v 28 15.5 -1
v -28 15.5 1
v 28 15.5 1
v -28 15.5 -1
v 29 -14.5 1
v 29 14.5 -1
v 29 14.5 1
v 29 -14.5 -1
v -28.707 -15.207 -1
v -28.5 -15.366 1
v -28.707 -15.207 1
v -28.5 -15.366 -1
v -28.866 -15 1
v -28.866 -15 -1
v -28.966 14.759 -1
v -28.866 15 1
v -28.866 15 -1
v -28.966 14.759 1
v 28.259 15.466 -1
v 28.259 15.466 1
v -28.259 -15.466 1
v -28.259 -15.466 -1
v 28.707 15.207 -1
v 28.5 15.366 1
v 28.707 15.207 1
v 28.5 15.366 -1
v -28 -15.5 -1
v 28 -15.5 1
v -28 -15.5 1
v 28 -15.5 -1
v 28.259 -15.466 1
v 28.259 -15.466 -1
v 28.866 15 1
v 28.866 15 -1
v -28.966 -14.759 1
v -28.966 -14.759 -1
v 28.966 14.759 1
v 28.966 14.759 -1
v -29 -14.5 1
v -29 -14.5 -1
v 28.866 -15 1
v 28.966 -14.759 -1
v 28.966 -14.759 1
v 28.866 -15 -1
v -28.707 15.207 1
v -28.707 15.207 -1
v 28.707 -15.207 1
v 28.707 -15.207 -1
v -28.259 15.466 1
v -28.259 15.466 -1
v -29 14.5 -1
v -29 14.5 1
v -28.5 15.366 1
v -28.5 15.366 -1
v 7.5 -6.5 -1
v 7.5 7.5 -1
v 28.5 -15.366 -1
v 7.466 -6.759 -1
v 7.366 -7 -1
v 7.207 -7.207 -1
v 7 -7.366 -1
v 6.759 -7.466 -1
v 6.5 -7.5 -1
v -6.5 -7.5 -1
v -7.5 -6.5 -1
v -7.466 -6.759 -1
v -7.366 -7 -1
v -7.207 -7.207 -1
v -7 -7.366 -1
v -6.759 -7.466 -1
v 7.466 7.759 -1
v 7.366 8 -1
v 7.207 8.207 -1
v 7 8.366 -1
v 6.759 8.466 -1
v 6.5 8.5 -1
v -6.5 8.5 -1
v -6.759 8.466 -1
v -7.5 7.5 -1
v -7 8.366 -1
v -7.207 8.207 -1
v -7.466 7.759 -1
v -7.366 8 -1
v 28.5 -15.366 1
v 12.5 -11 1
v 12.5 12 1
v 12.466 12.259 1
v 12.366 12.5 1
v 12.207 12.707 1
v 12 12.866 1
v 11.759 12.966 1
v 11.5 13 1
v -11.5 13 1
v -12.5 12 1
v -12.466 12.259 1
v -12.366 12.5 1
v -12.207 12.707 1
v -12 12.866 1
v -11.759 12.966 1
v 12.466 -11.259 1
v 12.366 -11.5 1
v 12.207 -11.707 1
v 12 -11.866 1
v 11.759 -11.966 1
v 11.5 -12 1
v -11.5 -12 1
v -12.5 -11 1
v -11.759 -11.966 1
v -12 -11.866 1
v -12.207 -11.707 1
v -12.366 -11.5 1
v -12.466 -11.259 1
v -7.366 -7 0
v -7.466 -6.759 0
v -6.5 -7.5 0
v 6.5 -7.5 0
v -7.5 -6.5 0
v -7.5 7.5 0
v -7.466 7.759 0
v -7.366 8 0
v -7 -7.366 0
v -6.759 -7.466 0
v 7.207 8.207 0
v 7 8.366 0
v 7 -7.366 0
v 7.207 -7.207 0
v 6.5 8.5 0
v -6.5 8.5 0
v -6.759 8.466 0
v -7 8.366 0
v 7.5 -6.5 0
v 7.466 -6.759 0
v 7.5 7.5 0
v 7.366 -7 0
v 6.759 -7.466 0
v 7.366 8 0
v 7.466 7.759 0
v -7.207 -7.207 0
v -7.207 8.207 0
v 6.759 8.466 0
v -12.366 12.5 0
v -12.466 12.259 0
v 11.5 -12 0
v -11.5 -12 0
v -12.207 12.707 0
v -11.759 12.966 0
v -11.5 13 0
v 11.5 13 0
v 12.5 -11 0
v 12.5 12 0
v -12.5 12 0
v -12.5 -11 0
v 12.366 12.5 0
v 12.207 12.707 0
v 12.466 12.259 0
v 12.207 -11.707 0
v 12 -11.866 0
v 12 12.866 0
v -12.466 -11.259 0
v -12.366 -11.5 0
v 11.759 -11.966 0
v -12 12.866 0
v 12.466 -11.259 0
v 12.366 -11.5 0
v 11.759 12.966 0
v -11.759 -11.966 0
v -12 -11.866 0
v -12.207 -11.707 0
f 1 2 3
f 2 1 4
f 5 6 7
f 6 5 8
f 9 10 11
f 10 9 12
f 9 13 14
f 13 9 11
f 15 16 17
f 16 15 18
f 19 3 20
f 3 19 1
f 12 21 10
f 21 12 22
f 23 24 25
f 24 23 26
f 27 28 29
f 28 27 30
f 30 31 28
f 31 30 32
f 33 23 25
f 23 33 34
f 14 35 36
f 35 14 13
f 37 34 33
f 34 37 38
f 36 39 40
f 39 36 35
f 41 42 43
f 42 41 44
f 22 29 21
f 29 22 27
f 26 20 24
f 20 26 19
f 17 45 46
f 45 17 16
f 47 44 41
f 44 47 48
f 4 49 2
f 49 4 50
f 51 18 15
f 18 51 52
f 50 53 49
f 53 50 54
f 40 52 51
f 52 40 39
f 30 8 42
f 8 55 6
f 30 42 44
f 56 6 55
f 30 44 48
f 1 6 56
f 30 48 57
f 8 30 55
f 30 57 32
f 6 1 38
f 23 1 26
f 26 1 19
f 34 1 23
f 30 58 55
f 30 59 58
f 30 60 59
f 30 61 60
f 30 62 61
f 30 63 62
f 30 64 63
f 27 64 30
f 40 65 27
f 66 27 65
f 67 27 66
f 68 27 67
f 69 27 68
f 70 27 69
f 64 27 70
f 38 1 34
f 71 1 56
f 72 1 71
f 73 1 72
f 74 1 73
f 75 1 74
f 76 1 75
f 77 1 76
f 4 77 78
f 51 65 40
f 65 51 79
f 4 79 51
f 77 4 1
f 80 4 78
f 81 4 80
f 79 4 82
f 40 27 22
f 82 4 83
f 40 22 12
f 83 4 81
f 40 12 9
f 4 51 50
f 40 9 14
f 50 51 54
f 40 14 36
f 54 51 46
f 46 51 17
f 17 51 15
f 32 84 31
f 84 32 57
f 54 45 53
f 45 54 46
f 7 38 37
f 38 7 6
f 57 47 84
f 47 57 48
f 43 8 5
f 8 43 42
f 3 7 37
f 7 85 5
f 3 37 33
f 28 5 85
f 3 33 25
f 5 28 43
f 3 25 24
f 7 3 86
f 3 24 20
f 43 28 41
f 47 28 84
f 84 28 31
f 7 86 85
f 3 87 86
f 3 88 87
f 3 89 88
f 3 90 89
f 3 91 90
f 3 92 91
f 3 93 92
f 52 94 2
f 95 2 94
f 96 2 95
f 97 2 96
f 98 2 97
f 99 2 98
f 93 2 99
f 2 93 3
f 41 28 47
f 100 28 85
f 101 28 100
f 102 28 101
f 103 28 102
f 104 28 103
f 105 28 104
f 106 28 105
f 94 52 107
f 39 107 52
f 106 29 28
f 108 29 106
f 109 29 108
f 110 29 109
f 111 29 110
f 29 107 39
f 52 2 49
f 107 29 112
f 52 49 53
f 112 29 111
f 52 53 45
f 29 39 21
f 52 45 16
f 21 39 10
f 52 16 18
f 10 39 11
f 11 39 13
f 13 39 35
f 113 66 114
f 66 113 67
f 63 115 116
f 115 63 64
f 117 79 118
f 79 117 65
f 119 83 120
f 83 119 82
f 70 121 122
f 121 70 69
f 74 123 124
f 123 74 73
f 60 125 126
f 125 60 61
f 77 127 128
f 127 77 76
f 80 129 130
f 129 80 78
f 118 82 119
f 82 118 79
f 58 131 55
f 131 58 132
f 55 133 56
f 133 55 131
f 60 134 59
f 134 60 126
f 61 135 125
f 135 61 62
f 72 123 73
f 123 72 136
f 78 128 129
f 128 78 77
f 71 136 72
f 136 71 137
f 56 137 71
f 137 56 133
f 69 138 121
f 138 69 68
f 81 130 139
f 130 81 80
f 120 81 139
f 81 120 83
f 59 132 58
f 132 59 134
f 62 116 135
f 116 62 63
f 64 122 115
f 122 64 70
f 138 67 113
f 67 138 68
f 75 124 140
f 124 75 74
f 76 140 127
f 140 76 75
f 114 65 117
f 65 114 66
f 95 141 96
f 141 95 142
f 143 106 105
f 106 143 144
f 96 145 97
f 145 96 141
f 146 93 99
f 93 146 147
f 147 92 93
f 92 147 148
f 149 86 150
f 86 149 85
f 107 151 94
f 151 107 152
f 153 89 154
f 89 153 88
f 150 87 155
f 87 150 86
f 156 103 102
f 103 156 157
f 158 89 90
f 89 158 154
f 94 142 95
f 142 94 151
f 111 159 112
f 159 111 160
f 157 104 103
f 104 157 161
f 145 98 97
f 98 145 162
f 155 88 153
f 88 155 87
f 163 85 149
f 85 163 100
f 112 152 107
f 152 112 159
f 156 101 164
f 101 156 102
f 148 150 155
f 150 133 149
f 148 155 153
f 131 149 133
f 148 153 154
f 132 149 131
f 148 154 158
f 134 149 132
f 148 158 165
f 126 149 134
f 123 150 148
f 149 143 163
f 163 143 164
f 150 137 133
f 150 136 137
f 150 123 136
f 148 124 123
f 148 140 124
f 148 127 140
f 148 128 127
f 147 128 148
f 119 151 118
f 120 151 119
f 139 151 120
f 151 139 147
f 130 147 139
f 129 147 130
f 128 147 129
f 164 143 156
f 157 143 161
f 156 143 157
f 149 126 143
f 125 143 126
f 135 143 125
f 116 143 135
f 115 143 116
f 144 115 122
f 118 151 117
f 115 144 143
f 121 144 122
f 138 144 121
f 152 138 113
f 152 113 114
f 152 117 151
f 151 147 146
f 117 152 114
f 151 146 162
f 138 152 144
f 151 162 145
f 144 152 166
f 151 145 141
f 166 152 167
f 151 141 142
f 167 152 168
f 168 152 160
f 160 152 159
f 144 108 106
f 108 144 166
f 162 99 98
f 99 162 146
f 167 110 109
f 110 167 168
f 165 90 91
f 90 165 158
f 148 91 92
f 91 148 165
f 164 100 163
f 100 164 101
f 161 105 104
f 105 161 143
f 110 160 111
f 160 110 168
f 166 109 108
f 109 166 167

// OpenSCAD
// file: ../OpenSCAD_Modules/cube_vround.scad
module cube_vround(
	size=[10,10,10],
	round_corners=[true,true,true,true],
	rounding=3,
	center_xy=false,
	center_z=false,
	attach=0,
	wall_attach=0,
	quality=2, //integer from 1 to infinity
)
{
	assert(len(size)==3);
	assert(len(round_corners)==4);
	assert(rounding>0);
	assert(rounding<=size[0]/2);
	assert(rounding<=size[1]/2);
	assert(quality>0);
	assert(attach>=0);
	assert(wall_attach>=0);
	height=size[2]+attach;
	cyl_r=rounding+wall_attach;
	cyl_mvx=size[0]/2-rounding;
	cyl_mvy=size[1]/2-rounding;
	cube_szx=size[0]/2;
	cube_szy=size[1]/2;
	cube_mvx=cube_szx/2+wall_attach;
	cube_mvy=cube_szy/2+wall_attach;
	translate([center_xy?0:cube_szx,center_xy?0:cube_szy,center_z?-attach/2:(size[2]-attach)/2])
		hull()
		{
			if(round_corners[0])
				translate([cyl_mvx,cyl_mvy])
					cylinder(r=cyl_r,h=height,$fn=12*quality,center=true);
			else
				translate([cube_mvx,cube_mvy])
					cube([cube_szx,cube_szy,height],center=true);
			if(round_corners[1])
				translate([cyl_mvx,-cyl_mvy])
					cylinder(r=cyl_r,h=height,$fn=12*quality,center=true);
			else
				translate([cube_mvx,-cube_mvy])
					cube([cube_szx,cube_szy,height],center=true);
			if(round_corners[2])
				translate([-cyl_mvx,-cyl_mvy])
					cylinder(r=cyl_r,h=height,$fn=12*quality,center=true);
			else
				translate([-cube_mvx,-cube_mvy])
					cube([cube_szx,cube_szy,height],center=true);
			if(round_corners[3])
				translate([-cyl_mvx,cyl_mvy])
					cylinder(r=cyl_r,h=height,$fn=12*quality,center=true);
			else
				translate([-cube_mvx,cube_mvy])
					cube([cube_szx,cube_szy,height],center=true);
		};
}

//example
cube_vround(round_corners=[true,false,true,false],
size=[10,20,6],
attach=0.1,
wall_attach=0.1,
rounding=3,
center_xy=true,center_z=false);
// main file
use <../OpenSCAD_Modules/cube_vround.scad>

module front_panel(
width=2,
quality=2,
)
{
	difference()
	{
		cube_vround(size=[58,31,width],rounding=1,center_xy=true,center_z=true,quality=quality);
		translate([0,0.5,0])
			cube_vround(size=[15,16,width+1],rounding=1,center_xy=true,center_z=true,quality=quality);
		translate([0,0.5,0])
			cube_vround(size=[25,25,width],rounding=1,center_xy=true,quality=quality);
	}
}

module front_panel_clip_cut(
width=1,
quality=2,
)
{
	union()
	{
		translate([-20,0.5,-width])
			cube_vround(size=[10,10,width],rounding=1,center_xy=true,quality=quality);
		translate([20,0.5,-width])
			cube_vround(size=[10,10,width],rounding=1,center_xy=true,quality=quality);
	}
}

front_panel();
front_panel_clip_cut();
